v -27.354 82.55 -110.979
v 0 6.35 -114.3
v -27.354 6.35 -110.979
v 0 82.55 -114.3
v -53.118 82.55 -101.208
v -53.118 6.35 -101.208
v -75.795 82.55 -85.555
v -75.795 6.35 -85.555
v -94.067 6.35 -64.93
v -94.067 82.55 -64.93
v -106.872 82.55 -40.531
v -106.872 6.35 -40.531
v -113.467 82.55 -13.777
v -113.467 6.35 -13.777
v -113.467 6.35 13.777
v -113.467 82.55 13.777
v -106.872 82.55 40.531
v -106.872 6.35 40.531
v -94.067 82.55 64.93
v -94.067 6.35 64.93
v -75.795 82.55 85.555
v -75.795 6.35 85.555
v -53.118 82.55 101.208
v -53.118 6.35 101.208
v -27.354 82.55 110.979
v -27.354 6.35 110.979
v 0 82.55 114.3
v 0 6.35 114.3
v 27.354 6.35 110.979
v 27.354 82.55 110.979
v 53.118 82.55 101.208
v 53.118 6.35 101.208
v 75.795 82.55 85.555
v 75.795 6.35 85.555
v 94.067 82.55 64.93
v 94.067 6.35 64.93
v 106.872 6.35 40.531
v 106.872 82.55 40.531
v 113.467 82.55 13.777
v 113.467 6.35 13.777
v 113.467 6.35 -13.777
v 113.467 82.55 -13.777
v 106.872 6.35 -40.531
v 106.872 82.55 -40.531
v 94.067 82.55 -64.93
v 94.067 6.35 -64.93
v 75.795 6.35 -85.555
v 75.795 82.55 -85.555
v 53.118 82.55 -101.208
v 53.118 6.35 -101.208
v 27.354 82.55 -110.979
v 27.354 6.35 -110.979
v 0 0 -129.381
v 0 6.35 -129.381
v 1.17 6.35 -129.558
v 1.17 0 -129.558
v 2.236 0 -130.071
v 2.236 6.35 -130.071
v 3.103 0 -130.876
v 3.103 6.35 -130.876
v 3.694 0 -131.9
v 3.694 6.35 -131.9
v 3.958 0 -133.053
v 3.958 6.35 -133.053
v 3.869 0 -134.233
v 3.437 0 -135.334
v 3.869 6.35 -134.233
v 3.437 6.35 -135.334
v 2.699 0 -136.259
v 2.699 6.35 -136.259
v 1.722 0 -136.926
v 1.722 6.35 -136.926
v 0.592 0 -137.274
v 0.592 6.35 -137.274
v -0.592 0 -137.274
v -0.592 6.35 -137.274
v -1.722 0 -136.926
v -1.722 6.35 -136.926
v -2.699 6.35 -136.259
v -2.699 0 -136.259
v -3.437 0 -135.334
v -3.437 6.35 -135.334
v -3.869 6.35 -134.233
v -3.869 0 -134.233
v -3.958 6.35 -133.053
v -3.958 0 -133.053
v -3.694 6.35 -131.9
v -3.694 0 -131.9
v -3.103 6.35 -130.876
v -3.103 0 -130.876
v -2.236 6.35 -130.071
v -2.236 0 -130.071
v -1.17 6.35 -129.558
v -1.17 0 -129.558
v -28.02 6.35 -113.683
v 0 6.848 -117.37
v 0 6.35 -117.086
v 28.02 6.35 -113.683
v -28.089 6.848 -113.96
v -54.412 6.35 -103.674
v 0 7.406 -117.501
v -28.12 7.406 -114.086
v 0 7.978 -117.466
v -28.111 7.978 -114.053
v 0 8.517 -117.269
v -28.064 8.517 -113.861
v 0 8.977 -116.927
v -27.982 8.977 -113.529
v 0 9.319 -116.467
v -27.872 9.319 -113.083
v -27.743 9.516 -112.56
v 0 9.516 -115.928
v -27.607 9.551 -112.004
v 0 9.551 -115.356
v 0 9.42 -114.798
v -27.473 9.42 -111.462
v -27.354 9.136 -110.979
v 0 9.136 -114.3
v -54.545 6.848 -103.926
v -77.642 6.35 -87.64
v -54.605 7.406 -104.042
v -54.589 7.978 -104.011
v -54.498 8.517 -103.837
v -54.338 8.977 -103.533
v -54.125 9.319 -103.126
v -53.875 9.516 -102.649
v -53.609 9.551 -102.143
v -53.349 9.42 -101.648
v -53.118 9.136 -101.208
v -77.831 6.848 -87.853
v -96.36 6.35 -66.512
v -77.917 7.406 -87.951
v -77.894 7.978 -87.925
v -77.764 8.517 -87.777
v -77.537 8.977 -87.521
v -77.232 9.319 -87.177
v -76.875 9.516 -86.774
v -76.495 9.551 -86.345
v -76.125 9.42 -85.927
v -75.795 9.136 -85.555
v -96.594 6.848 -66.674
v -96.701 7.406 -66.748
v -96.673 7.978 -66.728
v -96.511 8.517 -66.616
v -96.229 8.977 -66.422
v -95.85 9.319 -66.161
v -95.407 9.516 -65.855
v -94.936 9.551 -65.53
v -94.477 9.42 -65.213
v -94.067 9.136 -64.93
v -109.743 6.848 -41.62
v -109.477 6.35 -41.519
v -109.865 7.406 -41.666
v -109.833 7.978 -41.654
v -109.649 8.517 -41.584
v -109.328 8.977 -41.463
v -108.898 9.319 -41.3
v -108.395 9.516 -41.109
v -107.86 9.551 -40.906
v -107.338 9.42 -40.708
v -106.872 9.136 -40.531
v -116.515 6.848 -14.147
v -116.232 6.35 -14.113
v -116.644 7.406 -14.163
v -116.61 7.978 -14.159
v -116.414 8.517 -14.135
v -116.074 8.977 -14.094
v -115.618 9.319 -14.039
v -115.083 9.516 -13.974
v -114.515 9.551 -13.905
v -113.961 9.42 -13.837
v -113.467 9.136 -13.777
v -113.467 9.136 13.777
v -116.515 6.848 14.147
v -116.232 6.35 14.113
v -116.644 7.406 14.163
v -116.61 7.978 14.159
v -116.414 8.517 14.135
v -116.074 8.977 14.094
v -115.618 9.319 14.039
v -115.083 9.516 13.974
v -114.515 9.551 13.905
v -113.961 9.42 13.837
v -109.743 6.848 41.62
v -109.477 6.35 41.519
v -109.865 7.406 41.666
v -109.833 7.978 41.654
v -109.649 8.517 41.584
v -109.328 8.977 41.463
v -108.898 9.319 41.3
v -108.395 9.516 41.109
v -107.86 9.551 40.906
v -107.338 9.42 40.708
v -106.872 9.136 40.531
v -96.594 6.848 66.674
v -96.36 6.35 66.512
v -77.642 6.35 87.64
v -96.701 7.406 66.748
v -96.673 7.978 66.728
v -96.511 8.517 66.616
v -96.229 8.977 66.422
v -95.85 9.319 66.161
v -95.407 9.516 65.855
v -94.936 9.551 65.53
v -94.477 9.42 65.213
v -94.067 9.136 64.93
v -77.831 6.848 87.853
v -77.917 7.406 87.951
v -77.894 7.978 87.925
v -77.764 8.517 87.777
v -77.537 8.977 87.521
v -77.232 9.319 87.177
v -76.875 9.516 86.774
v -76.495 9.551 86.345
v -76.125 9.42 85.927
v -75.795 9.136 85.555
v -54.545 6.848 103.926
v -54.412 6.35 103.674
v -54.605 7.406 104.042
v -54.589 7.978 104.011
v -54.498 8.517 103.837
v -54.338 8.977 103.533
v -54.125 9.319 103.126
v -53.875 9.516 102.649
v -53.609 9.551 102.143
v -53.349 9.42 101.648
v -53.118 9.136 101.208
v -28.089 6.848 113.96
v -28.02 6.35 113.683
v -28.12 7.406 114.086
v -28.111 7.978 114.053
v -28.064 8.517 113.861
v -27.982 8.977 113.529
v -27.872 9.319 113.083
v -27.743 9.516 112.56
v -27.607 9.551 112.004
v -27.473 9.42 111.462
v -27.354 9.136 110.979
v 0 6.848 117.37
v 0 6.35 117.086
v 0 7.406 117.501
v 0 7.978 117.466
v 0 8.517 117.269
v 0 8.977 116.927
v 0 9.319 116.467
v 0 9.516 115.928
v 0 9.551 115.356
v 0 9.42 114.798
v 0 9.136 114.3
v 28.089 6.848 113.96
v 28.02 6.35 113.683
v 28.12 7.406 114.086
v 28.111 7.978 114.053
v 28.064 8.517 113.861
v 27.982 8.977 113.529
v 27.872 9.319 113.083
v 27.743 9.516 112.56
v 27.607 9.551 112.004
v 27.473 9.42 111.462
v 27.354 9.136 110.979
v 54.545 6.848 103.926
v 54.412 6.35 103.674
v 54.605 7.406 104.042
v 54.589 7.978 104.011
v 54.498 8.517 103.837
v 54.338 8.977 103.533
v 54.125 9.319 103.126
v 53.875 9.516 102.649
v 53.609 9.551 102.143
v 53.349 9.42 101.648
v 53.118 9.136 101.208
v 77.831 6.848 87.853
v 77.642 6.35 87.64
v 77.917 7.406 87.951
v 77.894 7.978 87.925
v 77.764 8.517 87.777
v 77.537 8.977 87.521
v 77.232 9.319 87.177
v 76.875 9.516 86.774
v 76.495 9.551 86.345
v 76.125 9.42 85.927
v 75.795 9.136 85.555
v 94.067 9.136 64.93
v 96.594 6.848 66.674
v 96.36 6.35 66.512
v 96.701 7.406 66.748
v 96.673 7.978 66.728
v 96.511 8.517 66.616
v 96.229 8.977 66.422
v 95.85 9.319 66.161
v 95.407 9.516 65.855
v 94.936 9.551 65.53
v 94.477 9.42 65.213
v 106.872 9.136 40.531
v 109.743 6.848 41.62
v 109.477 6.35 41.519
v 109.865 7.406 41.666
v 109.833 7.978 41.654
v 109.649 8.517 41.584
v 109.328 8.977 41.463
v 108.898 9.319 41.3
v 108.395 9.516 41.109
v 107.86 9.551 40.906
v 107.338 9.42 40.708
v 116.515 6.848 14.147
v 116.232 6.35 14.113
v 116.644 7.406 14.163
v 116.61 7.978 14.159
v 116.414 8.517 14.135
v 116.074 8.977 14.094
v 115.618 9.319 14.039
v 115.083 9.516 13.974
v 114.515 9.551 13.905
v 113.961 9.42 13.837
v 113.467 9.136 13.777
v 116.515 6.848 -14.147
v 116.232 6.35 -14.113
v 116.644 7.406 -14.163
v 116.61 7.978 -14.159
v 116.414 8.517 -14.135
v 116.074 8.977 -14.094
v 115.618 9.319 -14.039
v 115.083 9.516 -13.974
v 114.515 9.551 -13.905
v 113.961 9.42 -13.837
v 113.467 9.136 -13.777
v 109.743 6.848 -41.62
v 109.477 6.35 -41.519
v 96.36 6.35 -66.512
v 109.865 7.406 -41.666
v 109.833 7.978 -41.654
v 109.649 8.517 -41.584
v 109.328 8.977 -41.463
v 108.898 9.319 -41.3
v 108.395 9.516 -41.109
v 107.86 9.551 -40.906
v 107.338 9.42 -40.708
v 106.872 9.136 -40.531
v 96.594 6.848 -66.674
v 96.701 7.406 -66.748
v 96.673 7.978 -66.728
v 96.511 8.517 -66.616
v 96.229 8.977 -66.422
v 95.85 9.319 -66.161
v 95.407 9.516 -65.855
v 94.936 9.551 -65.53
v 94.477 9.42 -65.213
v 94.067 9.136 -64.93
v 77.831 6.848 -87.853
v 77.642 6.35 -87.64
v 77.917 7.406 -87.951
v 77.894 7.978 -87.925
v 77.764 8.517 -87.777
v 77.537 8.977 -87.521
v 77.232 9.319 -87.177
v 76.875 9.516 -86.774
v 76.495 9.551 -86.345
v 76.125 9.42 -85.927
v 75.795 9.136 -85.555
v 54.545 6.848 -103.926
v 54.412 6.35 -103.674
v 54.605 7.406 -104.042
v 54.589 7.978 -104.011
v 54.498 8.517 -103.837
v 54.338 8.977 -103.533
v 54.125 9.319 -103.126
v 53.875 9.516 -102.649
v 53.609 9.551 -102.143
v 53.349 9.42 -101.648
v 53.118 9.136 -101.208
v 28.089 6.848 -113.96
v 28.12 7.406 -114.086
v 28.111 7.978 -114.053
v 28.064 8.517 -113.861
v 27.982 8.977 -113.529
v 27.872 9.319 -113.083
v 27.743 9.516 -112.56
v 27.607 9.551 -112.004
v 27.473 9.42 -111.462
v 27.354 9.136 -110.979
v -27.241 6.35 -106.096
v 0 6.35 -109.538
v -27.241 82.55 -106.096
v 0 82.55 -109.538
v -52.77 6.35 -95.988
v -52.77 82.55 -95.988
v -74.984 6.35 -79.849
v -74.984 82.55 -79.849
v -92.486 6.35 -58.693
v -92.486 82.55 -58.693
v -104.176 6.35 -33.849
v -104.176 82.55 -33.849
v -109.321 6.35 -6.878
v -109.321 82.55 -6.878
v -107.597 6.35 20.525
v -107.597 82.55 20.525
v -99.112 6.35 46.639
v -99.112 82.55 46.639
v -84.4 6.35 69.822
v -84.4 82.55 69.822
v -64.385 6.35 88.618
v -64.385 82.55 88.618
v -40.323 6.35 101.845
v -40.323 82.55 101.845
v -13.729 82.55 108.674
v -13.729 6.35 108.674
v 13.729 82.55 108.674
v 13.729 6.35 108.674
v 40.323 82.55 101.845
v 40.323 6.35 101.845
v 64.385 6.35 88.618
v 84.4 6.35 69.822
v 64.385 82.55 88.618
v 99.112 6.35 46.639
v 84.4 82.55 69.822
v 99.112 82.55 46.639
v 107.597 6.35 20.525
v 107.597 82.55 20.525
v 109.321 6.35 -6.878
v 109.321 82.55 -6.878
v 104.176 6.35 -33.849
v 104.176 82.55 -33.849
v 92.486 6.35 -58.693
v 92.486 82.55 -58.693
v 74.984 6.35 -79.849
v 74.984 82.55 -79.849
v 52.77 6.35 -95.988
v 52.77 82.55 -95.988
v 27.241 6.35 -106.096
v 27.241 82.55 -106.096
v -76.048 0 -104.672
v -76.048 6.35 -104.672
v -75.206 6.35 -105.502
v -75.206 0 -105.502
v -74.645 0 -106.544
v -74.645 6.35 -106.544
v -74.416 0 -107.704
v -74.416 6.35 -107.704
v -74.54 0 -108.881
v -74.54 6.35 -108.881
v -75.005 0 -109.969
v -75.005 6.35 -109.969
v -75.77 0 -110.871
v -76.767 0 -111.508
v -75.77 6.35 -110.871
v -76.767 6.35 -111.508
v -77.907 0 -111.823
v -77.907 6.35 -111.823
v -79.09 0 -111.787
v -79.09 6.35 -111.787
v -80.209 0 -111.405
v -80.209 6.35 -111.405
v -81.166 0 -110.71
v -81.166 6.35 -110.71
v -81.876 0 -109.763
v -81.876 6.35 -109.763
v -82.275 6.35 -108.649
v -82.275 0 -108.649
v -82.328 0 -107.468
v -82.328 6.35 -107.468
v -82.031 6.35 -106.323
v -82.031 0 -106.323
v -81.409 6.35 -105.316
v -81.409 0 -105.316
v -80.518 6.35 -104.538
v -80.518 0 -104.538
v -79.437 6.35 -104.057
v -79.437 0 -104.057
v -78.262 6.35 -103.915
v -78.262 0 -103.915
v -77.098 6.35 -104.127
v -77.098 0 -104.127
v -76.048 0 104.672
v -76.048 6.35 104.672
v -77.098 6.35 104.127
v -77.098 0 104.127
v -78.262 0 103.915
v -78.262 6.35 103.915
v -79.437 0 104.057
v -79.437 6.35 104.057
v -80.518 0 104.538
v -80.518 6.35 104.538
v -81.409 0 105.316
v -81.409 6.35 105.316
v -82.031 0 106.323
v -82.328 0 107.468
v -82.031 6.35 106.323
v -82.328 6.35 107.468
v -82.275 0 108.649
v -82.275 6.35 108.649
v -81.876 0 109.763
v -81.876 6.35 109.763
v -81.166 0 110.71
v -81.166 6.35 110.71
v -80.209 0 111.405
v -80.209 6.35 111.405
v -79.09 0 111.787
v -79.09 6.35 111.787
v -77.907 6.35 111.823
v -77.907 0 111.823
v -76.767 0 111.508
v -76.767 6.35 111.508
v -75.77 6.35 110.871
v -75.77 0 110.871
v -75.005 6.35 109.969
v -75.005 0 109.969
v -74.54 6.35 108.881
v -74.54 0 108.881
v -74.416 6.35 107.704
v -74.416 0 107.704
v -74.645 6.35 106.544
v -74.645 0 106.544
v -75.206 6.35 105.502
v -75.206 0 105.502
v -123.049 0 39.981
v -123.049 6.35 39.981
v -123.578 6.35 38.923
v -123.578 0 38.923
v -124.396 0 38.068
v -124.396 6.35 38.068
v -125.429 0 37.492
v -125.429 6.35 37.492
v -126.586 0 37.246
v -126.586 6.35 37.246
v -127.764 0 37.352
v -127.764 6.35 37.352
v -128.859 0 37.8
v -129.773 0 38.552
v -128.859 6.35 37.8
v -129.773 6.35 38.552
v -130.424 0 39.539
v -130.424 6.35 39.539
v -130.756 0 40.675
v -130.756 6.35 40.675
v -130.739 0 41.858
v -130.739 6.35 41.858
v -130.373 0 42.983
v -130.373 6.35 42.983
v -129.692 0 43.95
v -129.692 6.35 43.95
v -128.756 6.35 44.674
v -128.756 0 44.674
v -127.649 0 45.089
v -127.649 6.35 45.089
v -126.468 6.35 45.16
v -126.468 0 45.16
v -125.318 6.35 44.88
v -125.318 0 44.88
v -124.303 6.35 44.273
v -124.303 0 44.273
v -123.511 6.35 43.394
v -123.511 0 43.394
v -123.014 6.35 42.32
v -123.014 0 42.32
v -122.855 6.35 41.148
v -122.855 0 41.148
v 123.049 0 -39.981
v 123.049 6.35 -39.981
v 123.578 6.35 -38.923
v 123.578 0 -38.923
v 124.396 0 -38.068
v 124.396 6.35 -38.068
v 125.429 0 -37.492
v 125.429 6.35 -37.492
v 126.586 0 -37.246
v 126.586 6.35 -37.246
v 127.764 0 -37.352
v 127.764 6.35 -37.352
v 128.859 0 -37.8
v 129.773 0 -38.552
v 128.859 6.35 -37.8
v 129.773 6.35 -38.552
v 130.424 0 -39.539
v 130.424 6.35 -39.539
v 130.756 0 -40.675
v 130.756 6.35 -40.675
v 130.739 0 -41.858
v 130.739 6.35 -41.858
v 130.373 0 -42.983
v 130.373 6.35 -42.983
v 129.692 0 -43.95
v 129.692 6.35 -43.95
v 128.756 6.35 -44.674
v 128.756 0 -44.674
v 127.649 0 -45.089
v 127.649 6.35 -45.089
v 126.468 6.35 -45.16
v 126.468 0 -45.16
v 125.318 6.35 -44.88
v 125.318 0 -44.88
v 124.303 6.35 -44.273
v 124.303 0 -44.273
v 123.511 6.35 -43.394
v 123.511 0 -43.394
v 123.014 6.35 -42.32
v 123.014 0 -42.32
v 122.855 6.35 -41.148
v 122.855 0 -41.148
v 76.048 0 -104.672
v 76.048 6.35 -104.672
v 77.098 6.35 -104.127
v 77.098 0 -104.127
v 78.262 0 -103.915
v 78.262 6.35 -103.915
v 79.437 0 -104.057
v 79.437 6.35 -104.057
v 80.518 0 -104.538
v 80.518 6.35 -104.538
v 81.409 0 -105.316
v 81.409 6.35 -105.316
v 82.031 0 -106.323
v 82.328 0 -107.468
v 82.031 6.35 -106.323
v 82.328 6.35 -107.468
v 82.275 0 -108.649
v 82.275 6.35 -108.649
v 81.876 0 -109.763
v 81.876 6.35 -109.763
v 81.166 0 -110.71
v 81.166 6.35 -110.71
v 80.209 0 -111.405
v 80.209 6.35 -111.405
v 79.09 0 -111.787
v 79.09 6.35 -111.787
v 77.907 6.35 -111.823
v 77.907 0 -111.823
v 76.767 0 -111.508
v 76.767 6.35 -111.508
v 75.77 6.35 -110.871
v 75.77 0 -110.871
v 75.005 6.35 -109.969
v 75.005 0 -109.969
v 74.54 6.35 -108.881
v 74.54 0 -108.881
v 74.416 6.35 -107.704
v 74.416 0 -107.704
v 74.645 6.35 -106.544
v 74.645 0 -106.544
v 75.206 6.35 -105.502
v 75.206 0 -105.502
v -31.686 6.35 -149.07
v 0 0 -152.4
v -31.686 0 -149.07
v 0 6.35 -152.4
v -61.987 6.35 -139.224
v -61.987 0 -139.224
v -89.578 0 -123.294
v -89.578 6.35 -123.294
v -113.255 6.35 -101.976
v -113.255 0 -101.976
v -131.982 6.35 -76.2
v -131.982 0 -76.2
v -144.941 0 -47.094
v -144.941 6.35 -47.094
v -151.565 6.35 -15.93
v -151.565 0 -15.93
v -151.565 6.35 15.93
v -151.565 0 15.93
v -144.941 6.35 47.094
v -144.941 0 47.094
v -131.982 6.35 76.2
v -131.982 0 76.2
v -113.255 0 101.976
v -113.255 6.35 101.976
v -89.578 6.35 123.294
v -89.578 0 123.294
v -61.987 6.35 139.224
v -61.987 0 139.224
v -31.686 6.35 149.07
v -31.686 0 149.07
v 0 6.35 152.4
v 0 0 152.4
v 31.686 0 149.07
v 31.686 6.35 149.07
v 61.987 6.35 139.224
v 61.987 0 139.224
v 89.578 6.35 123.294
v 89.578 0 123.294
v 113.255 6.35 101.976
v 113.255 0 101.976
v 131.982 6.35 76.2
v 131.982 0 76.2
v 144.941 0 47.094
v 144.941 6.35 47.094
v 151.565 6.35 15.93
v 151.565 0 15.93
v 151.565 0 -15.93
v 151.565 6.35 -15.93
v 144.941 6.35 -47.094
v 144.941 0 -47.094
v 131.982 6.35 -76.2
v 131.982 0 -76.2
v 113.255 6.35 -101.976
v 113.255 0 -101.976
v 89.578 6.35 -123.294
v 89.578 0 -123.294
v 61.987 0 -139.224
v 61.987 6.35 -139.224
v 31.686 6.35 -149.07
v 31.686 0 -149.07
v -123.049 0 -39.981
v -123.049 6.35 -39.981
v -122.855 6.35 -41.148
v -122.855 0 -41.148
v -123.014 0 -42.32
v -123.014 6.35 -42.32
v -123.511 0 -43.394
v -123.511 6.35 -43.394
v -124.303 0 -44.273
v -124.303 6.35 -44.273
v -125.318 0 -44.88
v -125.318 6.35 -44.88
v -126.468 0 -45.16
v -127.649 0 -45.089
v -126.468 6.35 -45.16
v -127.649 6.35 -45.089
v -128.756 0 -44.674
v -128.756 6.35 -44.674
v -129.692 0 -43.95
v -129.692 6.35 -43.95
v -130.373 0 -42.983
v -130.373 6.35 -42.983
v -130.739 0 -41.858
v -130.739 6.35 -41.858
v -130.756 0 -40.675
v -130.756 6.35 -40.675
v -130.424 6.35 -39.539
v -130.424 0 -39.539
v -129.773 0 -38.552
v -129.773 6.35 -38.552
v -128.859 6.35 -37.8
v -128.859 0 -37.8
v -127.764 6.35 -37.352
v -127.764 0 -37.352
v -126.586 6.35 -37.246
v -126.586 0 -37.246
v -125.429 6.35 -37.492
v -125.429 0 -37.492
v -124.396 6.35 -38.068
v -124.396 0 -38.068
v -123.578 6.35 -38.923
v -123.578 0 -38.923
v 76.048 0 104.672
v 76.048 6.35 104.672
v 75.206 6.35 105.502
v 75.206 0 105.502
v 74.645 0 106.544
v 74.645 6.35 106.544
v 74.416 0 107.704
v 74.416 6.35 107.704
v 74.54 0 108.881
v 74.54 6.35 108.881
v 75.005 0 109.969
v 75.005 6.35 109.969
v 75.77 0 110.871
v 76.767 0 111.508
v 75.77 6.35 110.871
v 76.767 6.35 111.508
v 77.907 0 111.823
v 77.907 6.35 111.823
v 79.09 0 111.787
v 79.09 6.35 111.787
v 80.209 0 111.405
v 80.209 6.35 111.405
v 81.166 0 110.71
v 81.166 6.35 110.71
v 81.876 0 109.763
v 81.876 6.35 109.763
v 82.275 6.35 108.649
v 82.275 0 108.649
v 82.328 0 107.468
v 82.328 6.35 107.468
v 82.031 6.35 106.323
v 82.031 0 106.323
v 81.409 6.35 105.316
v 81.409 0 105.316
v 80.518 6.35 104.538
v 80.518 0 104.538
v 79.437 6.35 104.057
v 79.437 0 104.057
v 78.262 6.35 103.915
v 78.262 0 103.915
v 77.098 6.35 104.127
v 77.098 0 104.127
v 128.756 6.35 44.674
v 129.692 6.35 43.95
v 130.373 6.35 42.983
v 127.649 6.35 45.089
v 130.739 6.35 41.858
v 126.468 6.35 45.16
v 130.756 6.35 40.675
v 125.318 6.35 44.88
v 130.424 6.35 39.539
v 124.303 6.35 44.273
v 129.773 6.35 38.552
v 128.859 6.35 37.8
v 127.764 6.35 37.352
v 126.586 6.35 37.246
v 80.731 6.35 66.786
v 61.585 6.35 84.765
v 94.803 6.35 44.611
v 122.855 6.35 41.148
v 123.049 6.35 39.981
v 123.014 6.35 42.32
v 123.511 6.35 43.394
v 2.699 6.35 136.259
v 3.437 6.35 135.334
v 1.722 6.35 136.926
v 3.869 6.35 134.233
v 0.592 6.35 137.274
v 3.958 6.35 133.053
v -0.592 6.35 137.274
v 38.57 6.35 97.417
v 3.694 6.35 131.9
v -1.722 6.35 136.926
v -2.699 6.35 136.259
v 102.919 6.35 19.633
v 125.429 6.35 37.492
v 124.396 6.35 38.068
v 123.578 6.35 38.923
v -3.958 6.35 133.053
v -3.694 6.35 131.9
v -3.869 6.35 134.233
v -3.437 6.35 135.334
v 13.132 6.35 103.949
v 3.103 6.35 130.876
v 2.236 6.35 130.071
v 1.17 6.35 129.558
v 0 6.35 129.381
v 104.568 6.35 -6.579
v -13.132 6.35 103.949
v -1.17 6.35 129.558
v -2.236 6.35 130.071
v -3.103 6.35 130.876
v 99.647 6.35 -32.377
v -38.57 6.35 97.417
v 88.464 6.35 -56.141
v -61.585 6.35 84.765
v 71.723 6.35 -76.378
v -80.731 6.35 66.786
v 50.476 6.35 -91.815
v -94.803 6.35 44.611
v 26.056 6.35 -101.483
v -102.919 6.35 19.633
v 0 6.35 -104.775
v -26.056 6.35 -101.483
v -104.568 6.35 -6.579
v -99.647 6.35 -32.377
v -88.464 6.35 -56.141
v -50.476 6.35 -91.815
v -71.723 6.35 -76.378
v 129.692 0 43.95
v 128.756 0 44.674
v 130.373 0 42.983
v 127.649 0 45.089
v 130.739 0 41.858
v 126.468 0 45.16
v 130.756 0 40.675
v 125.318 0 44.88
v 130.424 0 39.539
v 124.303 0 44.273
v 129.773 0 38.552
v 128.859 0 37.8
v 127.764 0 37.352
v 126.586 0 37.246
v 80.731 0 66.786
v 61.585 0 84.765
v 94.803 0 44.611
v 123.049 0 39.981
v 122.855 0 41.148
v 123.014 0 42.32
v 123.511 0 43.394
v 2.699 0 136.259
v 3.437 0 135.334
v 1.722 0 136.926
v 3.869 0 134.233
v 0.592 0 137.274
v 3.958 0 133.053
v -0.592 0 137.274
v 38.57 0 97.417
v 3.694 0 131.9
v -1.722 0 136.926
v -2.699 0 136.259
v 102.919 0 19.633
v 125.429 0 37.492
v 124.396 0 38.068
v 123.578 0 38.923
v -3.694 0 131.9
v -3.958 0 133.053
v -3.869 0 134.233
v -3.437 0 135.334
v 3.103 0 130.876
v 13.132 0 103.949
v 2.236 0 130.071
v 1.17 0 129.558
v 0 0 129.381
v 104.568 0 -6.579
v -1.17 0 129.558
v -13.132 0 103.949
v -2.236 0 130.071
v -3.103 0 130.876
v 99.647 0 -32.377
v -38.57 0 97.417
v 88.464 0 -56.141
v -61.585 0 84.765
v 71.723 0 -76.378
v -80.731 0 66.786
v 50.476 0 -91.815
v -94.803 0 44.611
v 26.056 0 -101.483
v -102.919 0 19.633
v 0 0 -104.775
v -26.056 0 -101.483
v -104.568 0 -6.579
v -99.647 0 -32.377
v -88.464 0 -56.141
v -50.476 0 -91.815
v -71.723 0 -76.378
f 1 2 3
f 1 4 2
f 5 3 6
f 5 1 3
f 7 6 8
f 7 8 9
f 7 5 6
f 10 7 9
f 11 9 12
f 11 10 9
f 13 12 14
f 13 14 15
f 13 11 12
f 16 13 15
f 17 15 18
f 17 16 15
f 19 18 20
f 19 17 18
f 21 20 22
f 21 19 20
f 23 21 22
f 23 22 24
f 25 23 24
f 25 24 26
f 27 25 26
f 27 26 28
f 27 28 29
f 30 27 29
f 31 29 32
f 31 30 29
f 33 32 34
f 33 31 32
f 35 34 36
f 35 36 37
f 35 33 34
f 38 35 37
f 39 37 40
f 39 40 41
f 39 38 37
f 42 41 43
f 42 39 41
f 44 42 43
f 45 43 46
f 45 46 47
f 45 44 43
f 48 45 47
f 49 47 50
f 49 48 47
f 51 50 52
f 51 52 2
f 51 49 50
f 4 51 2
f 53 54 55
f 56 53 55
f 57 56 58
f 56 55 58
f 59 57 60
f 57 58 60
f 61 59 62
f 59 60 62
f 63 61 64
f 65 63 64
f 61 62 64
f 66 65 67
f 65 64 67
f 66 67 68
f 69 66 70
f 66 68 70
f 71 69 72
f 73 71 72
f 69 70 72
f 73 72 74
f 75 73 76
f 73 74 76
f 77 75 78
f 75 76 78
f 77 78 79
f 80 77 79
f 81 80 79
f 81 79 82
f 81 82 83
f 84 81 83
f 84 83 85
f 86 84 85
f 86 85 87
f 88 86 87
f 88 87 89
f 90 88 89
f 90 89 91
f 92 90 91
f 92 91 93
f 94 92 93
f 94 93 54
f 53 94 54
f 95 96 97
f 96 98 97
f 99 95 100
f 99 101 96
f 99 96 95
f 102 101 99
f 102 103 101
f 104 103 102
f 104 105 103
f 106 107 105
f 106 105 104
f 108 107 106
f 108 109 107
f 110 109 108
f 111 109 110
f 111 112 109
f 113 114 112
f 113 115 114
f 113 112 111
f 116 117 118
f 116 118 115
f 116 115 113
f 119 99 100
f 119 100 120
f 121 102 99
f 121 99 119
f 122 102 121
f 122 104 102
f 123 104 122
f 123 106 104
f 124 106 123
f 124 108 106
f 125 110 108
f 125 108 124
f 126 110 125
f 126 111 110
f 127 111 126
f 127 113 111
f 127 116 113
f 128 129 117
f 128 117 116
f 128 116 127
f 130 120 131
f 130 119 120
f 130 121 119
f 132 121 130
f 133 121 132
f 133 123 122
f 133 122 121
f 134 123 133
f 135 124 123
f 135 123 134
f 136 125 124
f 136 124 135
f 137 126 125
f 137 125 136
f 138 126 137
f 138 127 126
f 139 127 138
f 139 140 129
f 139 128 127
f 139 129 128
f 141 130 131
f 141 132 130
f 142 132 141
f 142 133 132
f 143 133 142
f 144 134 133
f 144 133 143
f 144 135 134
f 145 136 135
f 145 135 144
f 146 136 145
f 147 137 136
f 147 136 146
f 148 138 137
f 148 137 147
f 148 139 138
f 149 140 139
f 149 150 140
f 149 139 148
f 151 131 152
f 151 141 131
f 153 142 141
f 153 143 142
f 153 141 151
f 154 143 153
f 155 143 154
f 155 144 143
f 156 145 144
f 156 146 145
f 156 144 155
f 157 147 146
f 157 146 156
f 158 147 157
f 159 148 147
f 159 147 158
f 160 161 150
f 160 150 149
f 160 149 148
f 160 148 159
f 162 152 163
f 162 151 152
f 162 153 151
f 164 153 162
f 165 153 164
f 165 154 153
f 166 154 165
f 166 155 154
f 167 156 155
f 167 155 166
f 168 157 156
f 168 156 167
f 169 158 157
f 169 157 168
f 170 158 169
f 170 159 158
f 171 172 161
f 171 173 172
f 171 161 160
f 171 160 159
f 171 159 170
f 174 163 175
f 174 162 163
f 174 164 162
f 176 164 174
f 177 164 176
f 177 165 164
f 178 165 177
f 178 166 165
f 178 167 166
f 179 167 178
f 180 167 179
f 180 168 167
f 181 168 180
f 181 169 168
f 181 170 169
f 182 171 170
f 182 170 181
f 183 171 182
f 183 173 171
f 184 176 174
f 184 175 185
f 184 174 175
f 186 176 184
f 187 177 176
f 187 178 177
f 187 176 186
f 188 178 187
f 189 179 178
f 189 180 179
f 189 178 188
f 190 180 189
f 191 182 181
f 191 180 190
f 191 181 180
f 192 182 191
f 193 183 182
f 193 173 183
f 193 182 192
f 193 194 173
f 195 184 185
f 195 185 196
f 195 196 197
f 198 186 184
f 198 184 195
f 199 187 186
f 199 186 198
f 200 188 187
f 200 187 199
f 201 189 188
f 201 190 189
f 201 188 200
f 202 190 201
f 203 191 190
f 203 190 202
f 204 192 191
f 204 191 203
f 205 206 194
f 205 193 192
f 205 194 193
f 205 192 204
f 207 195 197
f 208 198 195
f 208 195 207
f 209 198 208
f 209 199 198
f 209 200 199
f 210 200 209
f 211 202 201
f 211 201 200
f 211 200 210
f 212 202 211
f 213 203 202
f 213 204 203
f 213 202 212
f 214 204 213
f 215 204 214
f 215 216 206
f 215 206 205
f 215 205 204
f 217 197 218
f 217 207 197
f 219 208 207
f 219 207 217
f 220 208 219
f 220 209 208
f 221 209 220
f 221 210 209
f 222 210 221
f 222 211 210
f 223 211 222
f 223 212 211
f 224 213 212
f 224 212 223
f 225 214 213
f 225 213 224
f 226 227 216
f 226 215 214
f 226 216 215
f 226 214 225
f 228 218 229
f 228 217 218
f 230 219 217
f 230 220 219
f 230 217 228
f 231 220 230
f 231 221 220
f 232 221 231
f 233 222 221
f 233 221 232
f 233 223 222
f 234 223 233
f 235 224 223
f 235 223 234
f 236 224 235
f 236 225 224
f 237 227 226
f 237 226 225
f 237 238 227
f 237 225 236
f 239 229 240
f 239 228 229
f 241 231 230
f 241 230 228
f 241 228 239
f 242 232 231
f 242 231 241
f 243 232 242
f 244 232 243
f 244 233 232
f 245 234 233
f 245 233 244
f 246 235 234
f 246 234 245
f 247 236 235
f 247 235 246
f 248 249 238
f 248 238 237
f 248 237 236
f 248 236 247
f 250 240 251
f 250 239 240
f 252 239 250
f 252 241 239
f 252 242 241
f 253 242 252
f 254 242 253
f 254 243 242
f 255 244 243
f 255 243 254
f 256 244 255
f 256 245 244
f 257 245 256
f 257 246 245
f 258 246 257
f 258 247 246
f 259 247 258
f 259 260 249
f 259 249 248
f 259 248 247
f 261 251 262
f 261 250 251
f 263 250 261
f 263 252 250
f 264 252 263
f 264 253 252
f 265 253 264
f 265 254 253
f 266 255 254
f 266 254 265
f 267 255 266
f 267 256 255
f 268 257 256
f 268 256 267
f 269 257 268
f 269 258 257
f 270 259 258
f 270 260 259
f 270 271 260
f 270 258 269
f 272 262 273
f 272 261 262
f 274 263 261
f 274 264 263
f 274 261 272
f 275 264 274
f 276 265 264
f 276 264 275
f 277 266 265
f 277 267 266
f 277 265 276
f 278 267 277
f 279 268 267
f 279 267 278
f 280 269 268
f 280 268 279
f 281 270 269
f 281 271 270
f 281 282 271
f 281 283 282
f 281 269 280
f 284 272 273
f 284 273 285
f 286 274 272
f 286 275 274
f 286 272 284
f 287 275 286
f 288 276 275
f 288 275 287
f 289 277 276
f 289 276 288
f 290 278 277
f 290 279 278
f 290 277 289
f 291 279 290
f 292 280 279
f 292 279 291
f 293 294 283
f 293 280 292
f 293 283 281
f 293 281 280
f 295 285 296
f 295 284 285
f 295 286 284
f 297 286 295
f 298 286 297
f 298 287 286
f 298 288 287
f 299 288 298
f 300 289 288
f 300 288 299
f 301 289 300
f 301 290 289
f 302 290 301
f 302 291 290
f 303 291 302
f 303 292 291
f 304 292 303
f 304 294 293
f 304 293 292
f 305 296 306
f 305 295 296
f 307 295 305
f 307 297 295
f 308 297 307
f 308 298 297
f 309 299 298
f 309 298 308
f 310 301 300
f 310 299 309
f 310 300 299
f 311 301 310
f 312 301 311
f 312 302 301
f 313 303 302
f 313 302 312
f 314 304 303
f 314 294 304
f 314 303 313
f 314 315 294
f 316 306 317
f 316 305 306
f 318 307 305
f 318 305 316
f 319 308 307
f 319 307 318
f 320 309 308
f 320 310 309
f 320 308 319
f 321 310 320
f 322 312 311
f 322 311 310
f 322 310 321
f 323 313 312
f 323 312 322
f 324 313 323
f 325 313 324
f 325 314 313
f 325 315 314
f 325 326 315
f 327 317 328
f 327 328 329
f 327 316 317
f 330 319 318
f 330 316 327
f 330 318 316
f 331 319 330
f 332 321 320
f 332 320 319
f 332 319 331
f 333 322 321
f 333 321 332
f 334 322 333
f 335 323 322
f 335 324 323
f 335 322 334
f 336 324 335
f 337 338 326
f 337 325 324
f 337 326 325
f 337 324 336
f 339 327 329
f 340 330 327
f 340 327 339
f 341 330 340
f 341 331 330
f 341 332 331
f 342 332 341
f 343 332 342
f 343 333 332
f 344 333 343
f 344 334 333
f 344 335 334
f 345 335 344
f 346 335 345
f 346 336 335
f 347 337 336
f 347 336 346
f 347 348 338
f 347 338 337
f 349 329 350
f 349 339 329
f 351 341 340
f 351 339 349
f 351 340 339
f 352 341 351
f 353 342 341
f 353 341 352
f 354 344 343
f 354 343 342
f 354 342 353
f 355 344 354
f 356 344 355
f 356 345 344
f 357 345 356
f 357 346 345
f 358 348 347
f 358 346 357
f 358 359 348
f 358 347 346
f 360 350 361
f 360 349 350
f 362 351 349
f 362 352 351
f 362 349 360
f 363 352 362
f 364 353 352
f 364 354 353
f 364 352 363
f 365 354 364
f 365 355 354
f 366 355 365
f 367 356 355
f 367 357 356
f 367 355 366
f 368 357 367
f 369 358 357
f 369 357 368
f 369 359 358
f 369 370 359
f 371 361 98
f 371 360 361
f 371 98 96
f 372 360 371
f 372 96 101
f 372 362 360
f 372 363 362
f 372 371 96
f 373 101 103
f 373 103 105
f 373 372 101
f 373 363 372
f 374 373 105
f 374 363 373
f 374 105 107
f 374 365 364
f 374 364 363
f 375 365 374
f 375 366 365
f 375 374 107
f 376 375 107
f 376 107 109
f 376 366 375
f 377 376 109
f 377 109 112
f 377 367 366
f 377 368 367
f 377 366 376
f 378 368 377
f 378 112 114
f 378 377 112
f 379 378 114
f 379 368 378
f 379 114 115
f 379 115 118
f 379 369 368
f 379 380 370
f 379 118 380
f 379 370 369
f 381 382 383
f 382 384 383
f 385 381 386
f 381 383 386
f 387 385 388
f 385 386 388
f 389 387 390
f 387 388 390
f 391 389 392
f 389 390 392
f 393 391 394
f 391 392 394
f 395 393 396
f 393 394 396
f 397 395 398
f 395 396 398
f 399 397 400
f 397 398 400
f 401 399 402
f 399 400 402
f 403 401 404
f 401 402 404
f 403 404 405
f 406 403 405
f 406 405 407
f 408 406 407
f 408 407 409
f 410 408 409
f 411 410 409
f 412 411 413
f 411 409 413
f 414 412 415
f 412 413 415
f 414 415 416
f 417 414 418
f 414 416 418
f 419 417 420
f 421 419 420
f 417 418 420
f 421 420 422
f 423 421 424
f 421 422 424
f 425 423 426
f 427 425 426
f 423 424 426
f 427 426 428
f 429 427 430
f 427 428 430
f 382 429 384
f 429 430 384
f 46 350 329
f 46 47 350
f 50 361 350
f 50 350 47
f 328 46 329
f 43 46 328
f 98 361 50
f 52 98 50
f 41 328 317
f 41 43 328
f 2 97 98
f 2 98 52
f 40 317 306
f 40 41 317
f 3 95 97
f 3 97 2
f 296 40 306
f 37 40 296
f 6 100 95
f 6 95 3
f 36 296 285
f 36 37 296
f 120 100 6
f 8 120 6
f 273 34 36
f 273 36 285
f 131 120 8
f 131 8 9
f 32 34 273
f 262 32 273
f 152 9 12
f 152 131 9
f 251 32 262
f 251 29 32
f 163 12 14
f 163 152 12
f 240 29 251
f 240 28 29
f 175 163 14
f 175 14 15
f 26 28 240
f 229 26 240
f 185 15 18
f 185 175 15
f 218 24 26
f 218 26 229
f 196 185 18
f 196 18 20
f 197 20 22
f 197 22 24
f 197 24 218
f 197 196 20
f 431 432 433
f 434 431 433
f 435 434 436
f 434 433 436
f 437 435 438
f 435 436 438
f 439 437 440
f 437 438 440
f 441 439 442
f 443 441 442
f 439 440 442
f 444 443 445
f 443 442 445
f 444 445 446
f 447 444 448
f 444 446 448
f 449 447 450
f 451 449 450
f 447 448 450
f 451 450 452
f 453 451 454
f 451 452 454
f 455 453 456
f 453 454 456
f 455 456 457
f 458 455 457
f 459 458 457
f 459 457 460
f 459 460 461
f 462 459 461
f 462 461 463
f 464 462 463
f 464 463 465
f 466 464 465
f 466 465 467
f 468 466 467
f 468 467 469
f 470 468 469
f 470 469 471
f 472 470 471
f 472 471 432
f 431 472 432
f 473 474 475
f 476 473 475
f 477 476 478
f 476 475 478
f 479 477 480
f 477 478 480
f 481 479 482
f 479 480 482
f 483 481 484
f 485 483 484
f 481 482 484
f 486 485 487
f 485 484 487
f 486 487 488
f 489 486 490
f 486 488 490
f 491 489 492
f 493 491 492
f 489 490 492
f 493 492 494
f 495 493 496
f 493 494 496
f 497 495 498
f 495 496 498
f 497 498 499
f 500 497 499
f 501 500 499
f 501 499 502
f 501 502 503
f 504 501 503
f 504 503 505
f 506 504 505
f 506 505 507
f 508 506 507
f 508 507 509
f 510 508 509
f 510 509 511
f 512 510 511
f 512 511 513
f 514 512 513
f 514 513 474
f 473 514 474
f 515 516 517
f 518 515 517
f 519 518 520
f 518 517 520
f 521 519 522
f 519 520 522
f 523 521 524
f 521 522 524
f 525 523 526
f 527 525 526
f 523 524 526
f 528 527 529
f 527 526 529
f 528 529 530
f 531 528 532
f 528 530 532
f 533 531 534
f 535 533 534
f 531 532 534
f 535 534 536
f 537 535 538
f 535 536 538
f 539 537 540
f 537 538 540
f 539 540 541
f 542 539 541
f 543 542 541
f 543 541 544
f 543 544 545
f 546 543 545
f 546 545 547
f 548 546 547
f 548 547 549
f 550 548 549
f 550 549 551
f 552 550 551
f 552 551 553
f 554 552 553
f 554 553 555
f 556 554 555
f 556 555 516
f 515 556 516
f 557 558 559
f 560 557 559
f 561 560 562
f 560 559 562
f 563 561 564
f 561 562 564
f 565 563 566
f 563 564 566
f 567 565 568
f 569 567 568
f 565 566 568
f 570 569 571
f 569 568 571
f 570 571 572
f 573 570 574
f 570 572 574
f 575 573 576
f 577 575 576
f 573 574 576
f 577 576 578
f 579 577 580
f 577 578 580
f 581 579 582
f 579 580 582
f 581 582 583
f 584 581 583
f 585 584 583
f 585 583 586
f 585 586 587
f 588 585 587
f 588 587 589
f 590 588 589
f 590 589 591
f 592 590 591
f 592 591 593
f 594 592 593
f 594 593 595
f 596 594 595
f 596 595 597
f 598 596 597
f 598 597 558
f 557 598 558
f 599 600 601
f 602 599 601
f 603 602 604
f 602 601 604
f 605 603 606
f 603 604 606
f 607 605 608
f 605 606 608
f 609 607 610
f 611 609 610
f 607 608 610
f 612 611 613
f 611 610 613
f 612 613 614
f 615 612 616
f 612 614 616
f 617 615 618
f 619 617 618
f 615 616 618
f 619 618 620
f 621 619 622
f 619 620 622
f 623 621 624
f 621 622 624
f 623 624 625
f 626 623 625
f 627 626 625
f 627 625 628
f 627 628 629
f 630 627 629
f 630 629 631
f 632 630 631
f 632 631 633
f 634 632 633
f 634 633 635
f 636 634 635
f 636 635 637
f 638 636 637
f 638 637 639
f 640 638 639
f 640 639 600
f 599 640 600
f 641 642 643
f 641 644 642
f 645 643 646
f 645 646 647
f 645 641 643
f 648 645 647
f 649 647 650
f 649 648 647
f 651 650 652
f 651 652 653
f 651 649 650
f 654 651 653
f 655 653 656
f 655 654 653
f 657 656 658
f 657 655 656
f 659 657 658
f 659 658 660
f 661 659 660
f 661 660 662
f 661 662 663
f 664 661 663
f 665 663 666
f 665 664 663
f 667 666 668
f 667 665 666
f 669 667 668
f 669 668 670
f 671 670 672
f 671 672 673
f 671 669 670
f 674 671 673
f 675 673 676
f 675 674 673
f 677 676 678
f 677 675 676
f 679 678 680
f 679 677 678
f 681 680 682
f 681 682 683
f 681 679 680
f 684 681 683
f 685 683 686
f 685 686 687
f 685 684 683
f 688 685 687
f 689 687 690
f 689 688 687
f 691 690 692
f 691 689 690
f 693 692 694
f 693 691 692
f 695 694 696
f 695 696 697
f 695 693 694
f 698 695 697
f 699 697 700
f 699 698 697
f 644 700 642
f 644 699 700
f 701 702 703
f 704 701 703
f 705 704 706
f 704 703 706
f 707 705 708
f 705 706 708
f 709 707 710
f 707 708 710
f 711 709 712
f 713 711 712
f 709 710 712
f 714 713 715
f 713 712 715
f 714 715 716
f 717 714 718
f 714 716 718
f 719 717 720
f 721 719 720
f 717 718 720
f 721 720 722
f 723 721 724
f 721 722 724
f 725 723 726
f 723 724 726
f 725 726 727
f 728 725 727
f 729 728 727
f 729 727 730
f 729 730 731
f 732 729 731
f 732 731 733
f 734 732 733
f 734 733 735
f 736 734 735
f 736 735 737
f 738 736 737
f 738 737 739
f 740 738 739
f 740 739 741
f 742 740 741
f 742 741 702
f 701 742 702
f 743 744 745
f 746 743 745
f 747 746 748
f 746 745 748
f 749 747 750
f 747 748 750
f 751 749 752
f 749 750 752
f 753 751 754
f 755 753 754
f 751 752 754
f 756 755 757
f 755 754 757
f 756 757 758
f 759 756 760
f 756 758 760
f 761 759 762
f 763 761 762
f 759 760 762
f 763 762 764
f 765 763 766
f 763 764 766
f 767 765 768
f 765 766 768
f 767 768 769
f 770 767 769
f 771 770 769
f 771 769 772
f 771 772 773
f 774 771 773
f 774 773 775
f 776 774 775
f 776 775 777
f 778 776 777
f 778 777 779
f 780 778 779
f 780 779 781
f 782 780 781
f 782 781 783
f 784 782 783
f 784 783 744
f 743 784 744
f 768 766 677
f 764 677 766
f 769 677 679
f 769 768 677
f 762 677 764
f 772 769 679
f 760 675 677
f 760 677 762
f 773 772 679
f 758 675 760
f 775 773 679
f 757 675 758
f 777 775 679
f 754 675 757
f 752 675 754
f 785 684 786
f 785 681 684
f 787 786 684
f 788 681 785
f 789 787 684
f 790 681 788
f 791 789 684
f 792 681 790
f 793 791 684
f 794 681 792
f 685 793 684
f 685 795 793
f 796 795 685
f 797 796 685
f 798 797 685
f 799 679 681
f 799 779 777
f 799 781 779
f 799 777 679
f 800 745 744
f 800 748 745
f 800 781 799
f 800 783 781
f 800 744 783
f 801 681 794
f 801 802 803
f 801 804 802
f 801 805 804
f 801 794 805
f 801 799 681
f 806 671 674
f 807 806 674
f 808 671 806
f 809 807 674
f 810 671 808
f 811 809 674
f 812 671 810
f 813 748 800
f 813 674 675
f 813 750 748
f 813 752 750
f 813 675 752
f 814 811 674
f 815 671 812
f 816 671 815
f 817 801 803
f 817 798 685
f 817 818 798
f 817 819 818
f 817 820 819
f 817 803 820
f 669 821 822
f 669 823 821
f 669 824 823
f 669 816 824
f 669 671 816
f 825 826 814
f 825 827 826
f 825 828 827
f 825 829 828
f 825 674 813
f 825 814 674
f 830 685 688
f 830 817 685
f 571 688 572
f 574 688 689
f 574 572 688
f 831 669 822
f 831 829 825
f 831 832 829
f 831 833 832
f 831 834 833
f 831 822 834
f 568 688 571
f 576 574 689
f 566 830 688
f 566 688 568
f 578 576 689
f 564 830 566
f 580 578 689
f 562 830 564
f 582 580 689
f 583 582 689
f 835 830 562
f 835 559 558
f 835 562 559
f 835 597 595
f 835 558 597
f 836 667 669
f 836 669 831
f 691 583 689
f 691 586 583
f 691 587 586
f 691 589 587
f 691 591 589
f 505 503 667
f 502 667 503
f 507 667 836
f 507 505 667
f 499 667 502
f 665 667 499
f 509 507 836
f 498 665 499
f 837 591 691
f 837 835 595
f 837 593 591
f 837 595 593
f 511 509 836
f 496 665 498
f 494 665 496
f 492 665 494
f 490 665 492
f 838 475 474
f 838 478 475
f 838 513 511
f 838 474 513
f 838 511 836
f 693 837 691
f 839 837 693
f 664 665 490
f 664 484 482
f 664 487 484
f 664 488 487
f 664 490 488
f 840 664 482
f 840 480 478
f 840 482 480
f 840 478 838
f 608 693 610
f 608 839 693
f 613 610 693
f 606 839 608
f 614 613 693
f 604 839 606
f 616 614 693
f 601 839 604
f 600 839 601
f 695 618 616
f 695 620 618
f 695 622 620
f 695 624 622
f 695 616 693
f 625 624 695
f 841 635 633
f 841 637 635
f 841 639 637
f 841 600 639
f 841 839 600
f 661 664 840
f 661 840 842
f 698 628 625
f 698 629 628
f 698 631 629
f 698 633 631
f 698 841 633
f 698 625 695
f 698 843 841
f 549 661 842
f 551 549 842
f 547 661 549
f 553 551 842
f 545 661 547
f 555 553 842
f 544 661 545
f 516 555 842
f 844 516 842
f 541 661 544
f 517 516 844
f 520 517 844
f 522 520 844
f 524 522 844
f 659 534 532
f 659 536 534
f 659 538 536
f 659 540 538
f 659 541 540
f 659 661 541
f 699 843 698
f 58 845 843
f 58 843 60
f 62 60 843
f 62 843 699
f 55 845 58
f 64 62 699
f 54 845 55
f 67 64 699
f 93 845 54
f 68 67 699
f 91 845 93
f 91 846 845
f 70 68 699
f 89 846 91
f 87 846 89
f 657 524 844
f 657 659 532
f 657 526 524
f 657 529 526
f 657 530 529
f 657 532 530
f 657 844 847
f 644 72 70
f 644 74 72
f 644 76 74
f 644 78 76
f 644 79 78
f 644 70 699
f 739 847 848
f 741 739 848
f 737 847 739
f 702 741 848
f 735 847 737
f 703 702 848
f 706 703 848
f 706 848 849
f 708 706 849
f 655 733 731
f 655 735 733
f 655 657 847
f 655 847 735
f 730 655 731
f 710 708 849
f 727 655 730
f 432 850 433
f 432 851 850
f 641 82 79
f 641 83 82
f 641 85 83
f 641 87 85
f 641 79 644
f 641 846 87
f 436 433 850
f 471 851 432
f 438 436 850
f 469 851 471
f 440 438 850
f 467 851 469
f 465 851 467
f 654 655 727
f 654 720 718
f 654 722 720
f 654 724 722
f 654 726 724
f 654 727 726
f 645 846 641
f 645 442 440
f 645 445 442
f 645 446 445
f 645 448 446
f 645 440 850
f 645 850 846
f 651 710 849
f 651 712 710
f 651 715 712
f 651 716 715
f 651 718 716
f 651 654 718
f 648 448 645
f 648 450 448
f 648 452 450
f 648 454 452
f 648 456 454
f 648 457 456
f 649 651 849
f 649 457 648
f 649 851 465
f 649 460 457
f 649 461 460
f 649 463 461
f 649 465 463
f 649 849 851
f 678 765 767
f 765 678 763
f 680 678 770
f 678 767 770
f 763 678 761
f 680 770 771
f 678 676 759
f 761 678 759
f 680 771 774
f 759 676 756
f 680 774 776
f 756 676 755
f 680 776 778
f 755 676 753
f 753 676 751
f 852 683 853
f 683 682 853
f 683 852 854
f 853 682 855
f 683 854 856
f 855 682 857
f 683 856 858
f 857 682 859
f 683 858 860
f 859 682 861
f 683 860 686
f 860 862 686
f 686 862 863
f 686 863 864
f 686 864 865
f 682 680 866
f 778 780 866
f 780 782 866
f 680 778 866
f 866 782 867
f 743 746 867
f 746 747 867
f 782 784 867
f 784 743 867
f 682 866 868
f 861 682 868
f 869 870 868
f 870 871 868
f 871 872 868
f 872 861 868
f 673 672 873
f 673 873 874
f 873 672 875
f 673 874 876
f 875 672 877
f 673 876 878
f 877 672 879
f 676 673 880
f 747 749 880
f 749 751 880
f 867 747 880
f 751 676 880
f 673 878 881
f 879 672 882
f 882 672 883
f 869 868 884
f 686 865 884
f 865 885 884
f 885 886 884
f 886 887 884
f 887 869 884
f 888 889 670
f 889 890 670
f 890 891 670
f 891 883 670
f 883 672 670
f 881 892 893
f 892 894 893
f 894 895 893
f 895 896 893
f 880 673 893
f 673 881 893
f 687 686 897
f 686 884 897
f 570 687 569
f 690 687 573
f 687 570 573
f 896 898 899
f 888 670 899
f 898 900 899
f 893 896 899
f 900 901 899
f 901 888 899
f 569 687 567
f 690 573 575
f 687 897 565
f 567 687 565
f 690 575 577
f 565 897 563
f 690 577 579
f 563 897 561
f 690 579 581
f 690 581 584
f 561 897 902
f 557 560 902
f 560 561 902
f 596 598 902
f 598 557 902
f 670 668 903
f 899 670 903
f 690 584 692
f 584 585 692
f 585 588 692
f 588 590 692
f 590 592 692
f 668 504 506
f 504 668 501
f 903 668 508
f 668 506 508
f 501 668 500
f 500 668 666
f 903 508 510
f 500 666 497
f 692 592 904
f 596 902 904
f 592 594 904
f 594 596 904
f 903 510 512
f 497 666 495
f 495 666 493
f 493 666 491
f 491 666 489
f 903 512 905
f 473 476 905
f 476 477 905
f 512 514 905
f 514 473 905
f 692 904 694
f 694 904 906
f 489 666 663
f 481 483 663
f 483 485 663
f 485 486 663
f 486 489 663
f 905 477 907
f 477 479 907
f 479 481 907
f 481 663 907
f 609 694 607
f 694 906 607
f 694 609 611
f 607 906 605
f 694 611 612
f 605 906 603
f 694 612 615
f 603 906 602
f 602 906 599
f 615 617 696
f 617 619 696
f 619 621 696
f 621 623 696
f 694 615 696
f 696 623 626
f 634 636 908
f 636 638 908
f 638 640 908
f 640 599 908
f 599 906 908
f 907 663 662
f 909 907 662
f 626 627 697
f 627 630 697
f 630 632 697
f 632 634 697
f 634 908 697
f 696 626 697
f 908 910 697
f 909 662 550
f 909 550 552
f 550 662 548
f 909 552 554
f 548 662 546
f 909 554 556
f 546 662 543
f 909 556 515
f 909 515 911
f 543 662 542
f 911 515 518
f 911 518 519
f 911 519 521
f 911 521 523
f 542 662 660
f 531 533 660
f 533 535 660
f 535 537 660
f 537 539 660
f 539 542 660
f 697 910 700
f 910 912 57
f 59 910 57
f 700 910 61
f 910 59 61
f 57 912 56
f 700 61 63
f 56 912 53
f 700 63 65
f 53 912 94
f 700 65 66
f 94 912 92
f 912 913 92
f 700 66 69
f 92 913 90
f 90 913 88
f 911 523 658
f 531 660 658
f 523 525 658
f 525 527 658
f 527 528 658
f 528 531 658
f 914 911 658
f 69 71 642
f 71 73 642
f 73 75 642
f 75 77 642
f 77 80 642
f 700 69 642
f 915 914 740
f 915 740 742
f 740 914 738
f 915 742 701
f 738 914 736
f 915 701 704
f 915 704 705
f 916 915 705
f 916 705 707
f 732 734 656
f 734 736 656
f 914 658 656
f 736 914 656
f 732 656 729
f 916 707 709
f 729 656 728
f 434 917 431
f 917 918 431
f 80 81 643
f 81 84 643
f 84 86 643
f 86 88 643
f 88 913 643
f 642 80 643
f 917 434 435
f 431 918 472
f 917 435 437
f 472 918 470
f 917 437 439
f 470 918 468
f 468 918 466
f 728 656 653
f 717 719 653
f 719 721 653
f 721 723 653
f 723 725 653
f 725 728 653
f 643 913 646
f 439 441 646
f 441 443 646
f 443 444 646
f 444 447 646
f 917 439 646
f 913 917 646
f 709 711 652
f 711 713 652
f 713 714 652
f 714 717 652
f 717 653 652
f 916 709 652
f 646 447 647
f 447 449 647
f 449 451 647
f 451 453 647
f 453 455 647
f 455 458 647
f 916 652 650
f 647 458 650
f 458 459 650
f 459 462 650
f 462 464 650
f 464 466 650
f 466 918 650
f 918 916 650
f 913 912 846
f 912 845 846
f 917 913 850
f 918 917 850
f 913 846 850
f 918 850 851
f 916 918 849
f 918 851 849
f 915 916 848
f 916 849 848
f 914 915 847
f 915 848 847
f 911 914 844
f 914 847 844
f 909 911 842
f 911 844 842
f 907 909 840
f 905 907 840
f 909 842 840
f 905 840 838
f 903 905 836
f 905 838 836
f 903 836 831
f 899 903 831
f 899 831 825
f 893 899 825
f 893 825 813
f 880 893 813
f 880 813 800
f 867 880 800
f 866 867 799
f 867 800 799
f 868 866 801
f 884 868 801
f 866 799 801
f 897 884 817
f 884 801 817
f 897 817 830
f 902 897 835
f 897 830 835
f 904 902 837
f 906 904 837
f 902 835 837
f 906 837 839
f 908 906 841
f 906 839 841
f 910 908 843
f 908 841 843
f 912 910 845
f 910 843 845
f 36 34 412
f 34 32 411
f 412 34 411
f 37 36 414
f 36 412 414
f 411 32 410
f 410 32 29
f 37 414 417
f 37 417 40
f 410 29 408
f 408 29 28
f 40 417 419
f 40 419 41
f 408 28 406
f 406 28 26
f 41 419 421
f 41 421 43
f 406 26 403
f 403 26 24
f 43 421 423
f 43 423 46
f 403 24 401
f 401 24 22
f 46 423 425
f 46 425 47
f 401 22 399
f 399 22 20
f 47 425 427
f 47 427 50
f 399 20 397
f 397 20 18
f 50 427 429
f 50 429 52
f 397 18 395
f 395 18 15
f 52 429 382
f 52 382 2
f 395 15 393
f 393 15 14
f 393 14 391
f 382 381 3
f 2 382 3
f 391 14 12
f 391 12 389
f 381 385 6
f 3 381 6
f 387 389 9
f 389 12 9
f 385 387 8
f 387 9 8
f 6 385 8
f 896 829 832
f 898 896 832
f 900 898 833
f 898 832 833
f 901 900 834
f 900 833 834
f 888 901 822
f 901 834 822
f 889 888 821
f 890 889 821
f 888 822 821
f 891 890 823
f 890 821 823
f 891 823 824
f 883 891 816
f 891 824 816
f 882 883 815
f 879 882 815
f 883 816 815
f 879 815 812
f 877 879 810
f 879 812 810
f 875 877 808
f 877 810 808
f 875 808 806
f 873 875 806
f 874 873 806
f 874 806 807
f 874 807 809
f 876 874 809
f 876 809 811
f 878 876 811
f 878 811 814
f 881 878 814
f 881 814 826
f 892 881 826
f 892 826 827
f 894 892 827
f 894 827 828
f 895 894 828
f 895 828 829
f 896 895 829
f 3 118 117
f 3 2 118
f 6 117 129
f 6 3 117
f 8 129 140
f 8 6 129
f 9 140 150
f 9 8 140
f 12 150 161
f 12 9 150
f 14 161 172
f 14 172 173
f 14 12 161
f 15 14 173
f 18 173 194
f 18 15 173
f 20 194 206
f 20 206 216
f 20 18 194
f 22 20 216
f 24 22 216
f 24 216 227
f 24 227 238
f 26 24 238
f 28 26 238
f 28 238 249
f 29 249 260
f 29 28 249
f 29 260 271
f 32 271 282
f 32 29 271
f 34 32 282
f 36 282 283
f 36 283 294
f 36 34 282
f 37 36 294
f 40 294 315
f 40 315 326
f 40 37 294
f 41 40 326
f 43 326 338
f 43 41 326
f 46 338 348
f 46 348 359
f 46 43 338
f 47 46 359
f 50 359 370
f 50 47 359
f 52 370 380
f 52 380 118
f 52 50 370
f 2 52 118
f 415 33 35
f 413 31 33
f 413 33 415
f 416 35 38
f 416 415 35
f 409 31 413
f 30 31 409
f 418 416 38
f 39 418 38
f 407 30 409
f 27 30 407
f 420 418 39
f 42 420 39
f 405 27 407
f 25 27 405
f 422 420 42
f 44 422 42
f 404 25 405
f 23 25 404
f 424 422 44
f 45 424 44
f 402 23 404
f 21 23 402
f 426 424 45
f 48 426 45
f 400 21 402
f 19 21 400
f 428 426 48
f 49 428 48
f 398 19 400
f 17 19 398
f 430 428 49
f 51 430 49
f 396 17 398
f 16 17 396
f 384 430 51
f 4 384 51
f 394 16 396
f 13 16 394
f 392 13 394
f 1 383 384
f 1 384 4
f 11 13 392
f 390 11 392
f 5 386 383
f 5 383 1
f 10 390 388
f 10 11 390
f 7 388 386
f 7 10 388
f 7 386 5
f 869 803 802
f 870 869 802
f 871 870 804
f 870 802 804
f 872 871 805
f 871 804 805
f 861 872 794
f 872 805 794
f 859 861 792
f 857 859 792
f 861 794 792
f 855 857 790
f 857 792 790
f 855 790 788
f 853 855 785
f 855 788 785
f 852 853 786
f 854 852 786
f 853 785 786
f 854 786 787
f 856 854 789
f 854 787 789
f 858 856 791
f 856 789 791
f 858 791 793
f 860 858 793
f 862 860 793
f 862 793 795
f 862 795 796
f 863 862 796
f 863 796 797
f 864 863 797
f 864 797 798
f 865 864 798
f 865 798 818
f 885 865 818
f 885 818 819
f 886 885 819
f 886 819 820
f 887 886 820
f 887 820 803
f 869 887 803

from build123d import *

# Parameters (mm, degrees)
SKETCH1_W          = 47.625
SKETCH1_H          = 6.35
SKETCH2_W          = 4.7625
SKETCH2_H          = 76.2
SKETCH4_R          = 3.96875
CUT_EXTRUDE1_DEPTH = 7.35
CIRPATTERN1_COUNT  = 10


with BuildPart() as part:
    # Sketch1 → Revolve1 (revolve)
    with BuildSketch(Plane.XY, mode=Mode.PRIVATE) as revolve1_sk:
        with Locations((-128.5875, 3.175)):
            Rectangle(SKETCH1_W, SKETCH1_H)
    revolve(revolve1_sk.sketch.rotate(Axis((0, 0, 0), (0, 1, 0)), 270), axis=Axis((0, 0, 0), (0, 1, 0)))  # turned: the seam where the file's is

    # Sketch4 → Cut-Extrude1 (cut, through all)
    with BuildSketch(Plane(origin=(0, 6.35, 0), x_dir=(1, 0, 0), z_dir=(0, 1, 0))):
        with Locations(Location((0, 133.35, 0), (0, 0, 270))):  # turned: the seam where the file's is
            Circle(SKETCH4_R)
    cut_extrude1 = extrude(amount=-CUT_EXTRUDE1_DEPTH, mode=Mode.SUBTRACT)

    # CirPattern1: Cut-Extrude1 ×10 about axis
    cirpattern1_axis = Axis((0, 0, 0), (0, 1, 0))
    for i in range(1, CIRPATTERN1_COUNT):
        add(cut_extrude1.rotate(cirpattern1_axis, i * 360 / CIRPATTERN1_COUNT), mode=Mode.SUBTRACT)


with BuildPart() as body_2:
    # Sketch2 → Revolve2 (revolve)
    with BuildSketch(Plane.XY, mode=Mode.PRIVATE) as revolve2_sk:
        with Locations((-111.91875, 44.45)):
            Rectangle(SKETCH2_W, SKETCH2_H)
    revolve(revolve2_sk.sketch.rotate(Axis((0, 0, 0), (0, 1, 0)), 270), axis=Axis((0, 0, 0), (0, 1, 0)))  # turned: the seam where the file's is


with BuildPart() as body_3:
    # Sketch3 → Revolve3 (revolve)
    with BuildSketch(Plane.XY, mode=Mode.PRIVATE) as revolve3_sk:
        with BuildLine():
            Line((-114.3, 6.35), (-117.085775819, 6.35))
            ThreePointArc((-117.085775819, 6.35), (-116.926537909, 8.976537909), (-114.3, 9.135775819))
            Line((-114.3, 9.135775819), (-114.3, 6.35))
        make_face()
    revolve(revolve3_sk.sketch.rotate(Axis((0, 0, 0), (0, 1, 0)), 270), axis=Axis((0, 0, 0), (0, 1, 0)))  # turned: the seam where the file's is


solid = Compound([part.part, body_2.part, body_3.part])
